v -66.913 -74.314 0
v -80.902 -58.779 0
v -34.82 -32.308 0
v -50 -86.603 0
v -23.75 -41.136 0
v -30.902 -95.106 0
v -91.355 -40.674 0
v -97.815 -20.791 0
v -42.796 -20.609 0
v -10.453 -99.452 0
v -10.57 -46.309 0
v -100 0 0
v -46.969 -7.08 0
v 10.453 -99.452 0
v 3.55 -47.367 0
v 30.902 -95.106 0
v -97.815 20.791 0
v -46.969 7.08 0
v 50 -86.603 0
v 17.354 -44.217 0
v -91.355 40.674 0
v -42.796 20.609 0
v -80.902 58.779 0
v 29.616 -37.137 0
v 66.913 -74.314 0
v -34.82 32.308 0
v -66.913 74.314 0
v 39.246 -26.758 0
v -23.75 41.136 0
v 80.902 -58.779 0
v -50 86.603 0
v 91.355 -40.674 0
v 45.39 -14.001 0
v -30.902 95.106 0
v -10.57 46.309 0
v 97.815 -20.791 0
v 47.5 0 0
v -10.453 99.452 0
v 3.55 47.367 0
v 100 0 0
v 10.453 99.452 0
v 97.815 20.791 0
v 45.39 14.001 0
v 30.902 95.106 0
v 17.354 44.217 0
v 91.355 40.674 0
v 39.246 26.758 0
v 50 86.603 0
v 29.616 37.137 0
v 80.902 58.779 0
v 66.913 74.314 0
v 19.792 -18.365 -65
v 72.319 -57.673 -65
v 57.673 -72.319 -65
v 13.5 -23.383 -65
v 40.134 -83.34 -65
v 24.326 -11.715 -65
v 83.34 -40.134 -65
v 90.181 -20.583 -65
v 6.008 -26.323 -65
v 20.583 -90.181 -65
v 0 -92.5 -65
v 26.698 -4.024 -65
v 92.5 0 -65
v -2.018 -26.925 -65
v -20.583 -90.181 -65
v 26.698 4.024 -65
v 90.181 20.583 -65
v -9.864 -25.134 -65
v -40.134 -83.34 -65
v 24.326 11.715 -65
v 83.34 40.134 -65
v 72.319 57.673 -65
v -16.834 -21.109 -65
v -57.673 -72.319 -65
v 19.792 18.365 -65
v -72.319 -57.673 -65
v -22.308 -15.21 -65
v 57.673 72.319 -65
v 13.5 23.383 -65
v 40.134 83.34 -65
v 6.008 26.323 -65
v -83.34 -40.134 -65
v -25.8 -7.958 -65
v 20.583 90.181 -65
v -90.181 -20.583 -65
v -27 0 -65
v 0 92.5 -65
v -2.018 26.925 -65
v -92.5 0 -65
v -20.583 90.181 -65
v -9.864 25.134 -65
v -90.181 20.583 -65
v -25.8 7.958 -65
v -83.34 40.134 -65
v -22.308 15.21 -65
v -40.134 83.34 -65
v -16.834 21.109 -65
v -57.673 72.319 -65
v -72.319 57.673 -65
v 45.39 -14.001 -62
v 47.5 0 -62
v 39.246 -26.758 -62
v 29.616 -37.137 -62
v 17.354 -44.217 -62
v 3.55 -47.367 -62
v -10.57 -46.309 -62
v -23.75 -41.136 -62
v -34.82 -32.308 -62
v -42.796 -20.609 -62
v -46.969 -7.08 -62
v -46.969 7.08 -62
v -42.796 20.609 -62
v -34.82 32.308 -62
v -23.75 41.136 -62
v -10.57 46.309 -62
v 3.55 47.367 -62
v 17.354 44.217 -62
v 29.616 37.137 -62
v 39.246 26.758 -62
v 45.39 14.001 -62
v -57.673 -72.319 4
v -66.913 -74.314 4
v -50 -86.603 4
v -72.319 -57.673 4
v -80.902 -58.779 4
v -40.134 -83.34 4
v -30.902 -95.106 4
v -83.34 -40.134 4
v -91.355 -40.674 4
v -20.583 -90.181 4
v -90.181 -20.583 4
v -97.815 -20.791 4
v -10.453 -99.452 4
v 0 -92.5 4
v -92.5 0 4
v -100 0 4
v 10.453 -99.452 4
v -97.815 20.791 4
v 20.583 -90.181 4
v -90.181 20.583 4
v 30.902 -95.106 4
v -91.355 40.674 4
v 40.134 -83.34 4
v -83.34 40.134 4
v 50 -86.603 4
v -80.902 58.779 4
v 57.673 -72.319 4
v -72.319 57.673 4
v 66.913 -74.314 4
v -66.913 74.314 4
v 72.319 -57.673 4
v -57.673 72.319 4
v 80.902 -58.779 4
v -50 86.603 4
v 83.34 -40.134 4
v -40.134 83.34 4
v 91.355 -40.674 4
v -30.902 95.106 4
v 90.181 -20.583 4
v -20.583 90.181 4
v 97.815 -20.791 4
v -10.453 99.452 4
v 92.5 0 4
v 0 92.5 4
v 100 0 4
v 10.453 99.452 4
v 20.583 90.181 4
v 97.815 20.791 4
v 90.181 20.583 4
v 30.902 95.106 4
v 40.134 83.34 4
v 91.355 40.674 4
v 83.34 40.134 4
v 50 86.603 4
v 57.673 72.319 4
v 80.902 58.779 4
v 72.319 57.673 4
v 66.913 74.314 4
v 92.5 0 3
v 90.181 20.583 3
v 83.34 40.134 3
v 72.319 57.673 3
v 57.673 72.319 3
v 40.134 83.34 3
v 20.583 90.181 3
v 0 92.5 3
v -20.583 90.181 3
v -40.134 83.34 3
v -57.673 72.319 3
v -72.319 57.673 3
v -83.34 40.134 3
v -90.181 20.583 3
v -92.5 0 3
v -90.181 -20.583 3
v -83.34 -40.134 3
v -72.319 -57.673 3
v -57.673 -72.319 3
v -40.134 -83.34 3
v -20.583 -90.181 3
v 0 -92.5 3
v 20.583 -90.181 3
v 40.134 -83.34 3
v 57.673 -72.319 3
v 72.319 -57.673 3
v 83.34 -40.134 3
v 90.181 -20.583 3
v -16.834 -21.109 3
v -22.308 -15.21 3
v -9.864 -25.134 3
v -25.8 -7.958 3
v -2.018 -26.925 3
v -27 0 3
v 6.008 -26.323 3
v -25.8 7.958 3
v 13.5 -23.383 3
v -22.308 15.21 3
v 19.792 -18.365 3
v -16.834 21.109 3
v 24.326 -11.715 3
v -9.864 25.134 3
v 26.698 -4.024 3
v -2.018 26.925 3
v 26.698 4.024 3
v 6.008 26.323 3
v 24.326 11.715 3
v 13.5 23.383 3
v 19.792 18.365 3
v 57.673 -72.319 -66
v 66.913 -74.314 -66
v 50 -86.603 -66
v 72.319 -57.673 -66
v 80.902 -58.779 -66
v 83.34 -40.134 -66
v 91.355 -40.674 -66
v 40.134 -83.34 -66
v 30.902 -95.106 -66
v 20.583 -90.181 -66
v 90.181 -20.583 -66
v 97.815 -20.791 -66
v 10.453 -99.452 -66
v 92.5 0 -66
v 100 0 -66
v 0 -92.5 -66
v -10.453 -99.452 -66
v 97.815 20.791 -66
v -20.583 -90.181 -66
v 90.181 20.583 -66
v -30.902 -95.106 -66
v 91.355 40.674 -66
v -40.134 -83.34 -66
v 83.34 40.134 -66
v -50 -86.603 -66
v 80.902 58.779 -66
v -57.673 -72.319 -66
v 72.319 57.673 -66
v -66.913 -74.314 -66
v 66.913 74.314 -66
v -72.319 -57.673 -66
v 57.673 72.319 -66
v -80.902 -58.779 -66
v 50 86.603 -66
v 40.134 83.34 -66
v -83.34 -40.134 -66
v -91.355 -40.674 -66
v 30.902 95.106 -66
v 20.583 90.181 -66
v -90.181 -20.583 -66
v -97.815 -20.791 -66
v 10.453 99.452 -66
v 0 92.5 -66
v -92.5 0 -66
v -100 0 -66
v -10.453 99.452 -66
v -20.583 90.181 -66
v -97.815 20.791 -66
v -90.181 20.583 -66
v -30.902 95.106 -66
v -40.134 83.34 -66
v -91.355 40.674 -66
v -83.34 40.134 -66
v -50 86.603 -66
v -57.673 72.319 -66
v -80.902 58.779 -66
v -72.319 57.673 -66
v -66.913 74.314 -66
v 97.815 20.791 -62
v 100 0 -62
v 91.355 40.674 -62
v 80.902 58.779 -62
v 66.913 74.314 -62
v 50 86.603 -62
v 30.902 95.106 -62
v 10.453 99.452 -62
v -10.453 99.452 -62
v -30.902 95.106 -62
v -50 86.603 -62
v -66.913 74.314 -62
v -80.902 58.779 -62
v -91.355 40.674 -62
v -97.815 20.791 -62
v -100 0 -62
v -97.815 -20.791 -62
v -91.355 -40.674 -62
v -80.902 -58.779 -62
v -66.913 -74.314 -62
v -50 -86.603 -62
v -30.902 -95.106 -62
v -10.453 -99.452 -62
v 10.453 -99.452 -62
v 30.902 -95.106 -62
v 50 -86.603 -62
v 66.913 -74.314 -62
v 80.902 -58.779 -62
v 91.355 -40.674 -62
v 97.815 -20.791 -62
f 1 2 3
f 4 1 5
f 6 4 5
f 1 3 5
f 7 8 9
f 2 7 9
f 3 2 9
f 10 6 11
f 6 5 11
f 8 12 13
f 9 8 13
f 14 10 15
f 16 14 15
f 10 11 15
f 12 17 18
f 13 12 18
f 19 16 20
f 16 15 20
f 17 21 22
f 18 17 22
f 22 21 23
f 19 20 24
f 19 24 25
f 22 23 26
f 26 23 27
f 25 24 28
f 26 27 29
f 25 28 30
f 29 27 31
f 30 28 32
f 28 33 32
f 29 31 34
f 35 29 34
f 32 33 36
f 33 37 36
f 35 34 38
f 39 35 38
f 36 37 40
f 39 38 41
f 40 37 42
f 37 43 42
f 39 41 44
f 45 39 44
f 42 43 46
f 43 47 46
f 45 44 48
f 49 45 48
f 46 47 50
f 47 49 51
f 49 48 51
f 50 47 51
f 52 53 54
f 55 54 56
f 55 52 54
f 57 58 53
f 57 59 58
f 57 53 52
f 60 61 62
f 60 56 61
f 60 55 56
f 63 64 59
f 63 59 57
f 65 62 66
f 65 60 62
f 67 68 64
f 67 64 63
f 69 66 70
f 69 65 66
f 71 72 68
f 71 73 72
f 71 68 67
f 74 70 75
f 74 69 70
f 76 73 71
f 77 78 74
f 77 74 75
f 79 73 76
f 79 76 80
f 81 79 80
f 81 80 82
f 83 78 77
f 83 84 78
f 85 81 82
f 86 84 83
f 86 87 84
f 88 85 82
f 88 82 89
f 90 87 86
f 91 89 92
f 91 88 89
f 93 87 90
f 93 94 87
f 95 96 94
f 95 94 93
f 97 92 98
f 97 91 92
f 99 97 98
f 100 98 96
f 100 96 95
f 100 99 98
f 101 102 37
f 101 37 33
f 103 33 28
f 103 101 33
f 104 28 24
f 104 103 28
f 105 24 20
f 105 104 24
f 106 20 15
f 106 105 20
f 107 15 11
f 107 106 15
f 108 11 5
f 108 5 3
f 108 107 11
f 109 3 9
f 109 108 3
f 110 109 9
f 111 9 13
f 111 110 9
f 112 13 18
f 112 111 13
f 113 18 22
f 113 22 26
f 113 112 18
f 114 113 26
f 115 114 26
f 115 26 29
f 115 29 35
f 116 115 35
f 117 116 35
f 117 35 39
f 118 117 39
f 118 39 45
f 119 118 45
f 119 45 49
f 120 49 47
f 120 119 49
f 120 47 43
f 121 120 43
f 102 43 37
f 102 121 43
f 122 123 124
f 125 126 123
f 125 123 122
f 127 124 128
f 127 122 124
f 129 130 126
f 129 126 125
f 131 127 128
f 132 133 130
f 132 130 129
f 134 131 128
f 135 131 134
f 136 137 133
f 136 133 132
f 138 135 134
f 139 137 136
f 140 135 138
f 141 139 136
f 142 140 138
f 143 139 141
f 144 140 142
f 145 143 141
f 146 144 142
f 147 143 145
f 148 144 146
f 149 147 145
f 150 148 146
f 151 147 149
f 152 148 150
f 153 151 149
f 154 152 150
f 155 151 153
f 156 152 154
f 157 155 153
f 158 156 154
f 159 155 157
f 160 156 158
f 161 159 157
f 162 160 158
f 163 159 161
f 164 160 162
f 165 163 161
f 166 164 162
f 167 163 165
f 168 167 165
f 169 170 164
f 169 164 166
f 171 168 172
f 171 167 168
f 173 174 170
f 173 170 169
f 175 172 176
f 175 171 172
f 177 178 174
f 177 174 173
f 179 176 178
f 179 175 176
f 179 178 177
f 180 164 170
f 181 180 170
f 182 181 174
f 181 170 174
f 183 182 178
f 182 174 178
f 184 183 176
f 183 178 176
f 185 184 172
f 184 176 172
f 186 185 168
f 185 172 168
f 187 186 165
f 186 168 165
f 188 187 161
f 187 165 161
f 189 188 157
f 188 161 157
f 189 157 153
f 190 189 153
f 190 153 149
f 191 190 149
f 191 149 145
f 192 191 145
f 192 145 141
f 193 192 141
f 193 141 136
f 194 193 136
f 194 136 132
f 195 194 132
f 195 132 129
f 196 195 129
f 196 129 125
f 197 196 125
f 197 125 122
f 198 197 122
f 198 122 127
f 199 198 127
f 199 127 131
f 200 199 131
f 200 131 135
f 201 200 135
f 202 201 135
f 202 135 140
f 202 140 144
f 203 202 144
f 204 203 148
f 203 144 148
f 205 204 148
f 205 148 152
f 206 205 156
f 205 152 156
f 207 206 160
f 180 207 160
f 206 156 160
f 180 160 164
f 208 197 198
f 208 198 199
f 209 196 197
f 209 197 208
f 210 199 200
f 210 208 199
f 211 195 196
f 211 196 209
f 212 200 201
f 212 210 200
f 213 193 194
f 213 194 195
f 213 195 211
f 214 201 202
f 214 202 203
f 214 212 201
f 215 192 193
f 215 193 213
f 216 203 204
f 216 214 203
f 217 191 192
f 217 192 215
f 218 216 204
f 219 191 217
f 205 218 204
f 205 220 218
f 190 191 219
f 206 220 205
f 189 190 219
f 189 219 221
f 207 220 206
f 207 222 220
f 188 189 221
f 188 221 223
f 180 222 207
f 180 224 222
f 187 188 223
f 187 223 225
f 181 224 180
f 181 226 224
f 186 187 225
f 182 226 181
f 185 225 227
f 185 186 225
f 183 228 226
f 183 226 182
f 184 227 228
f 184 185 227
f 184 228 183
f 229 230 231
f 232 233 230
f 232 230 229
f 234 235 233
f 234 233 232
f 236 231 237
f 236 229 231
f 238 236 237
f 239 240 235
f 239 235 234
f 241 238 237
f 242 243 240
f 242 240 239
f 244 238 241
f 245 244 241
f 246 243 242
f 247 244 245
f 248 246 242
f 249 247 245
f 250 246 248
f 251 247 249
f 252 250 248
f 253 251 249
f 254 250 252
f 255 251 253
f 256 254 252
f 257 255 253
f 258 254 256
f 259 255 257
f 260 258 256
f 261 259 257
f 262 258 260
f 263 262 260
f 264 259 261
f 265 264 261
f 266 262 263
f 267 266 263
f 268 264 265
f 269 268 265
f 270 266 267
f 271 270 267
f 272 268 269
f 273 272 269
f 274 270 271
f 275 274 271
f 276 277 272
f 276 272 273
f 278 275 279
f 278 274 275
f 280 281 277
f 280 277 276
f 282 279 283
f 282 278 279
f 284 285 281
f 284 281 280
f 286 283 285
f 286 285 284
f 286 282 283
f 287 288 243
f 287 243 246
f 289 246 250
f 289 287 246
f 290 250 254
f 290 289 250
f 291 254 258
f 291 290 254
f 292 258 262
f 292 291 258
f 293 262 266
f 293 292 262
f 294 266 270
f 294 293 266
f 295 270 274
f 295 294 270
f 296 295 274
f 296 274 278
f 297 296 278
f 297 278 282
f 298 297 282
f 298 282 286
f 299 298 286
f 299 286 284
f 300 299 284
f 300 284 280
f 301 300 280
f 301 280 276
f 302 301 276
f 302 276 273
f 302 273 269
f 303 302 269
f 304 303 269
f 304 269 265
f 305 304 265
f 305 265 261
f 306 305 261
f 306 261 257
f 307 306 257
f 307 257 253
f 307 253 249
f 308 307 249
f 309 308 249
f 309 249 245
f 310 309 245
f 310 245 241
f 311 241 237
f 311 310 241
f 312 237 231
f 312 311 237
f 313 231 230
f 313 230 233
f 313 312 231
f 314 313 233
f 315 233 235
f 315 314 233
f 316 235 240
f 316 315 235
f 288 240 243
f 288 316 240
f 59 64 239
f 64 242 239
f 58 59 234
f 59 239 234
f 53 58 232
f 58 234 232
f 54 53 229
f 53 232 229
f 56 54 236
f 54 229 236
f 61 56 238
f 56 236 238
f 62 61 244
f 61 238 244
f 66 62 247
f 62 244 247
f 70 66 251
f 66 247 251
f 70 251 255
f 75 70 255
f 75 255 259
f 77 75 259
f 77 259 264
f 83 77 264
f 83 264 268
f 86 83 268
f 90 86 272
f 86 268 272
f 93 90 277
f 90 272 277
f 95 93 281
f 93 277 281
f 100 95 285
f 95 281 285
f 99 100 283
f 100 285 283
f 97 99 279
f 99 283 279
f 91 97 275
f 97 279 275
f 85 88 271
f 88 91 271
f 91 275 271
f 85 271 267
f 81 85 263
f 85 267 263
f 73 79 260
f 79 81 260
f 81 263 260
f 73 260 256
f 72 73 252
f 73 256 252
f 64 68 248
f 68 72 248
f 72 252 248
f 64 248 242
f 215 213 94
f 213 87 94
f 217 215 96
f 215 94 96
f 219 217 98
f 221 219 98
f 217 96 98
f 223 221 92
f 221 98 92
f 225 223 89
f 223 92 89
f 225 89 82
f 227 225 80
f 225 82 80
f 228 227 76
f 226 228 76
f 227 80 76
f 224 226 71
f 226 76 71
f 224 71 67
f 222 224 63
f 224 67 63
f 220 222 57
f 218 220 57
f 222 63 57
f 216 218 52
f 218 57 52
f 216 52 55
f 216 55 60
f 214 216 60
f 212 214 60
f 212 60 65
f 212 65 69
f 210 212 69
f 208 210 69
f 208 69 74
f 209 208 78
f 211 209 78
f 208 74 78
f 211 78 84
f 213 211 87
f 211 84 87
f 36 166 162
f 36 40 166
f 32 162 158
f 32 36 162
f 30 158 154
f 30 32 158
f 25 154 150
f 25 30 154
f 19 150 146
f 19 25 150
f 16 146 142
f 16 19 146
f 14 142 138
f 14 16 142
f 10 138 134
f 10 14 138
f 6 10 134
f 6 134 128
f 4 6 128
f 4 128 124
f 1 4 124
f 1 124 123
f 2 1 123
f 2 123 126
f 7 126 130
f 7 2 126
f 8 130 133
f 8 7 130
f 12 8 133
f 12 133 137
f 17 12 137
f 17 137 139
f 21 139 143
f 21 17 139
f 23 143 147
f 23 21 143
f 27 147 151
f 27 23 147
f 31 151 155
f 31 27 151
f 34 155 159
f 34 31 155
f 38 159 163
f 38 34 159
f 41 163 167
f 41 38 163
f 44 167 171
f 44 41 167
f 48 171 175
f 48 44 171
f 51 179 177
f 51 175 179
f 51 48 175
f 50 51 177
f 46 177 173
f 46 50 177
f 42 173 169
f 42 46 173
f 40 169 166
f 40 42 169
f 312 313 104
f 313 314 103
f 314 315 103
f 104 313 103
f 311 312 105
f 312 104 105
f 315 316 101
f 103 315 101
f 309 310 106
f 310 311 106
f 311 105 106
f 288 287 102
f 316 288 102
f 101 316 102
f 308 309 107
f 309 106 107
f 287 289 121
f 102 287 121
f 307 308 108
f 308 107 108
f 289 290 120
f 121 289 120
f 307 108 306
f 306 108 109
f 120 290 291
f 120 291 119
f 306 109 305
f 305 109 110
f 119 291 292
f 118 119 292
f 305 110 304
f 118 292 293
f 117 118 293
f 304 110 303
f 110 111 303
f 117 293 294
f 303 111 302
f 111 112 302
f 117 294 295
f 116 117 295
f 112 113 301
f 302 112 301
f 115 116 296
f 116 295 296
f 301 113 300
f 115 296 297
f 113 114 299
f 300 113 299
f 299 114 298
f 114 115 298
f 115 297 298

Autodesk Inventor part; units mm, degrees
ref_plane "YZ Plane" through (0, 0, 0) normal (1, 0, 0) x (0, 1, 0)
ref_plane "XZ Plane" through (0, 0, 0) normal (0, 1, 0) x (-1, 0, 0)
sketch "Sketch11" plane through (0, 0, 0) normal (0, 0, 1) x (1, 0, 0)
  circle A0 centre (0, 0) radius 100
  dimension "d39" = 200
extrude "Extrusion10" add sketch "Sketch11" along normal blind 4
sketch "Sketch12" plane through (0, 0, 4) normal (0, 0, 1) x (1, 0, 0)
  circle A0 centre (0, 0) radius 100 projected
  circle A1 centre (0, 0) radius 92.5
  dimension "d42" = 185
extrude "Extrusion11" cut sketch "Sketch12" against normal blind 1 contours A1
ref_plane "Work Plane1" through (0, 0, -31) normal (0, 0, -1) x (-1, 0, 0)
mirror "Mirror1" about plane through (0, 0, -31) normal (0, 0, -1)
sketch "Sketch14" plane through (0, 0, -62) normal (0, 0, 1) x (1, 0, 0)
  circle A0 centre (0, 0) radius 100 projected
  circle A1 centre (0, 0) radius 47.5
  dimension "d46" = 95
extrude "Extrusion12" add sketch "Sketch14" along normal up to next contours A1
sketch "Sketch15" plane through (0, 0, -65) normal (0, 0, -1) x (-1, 0, 0)
  circle A0 centre (0, 0) radius 92.5 projected
  circle A1 centre (0, 0) radius 27
  dimension "d50" = 54
extrude "Extrusion13" cut sketch "Sketch15" against normal up to surface (68 mm away) contours A1
properties part number "SpoolFilamentToyBuilder" material "ABS Plastic"
